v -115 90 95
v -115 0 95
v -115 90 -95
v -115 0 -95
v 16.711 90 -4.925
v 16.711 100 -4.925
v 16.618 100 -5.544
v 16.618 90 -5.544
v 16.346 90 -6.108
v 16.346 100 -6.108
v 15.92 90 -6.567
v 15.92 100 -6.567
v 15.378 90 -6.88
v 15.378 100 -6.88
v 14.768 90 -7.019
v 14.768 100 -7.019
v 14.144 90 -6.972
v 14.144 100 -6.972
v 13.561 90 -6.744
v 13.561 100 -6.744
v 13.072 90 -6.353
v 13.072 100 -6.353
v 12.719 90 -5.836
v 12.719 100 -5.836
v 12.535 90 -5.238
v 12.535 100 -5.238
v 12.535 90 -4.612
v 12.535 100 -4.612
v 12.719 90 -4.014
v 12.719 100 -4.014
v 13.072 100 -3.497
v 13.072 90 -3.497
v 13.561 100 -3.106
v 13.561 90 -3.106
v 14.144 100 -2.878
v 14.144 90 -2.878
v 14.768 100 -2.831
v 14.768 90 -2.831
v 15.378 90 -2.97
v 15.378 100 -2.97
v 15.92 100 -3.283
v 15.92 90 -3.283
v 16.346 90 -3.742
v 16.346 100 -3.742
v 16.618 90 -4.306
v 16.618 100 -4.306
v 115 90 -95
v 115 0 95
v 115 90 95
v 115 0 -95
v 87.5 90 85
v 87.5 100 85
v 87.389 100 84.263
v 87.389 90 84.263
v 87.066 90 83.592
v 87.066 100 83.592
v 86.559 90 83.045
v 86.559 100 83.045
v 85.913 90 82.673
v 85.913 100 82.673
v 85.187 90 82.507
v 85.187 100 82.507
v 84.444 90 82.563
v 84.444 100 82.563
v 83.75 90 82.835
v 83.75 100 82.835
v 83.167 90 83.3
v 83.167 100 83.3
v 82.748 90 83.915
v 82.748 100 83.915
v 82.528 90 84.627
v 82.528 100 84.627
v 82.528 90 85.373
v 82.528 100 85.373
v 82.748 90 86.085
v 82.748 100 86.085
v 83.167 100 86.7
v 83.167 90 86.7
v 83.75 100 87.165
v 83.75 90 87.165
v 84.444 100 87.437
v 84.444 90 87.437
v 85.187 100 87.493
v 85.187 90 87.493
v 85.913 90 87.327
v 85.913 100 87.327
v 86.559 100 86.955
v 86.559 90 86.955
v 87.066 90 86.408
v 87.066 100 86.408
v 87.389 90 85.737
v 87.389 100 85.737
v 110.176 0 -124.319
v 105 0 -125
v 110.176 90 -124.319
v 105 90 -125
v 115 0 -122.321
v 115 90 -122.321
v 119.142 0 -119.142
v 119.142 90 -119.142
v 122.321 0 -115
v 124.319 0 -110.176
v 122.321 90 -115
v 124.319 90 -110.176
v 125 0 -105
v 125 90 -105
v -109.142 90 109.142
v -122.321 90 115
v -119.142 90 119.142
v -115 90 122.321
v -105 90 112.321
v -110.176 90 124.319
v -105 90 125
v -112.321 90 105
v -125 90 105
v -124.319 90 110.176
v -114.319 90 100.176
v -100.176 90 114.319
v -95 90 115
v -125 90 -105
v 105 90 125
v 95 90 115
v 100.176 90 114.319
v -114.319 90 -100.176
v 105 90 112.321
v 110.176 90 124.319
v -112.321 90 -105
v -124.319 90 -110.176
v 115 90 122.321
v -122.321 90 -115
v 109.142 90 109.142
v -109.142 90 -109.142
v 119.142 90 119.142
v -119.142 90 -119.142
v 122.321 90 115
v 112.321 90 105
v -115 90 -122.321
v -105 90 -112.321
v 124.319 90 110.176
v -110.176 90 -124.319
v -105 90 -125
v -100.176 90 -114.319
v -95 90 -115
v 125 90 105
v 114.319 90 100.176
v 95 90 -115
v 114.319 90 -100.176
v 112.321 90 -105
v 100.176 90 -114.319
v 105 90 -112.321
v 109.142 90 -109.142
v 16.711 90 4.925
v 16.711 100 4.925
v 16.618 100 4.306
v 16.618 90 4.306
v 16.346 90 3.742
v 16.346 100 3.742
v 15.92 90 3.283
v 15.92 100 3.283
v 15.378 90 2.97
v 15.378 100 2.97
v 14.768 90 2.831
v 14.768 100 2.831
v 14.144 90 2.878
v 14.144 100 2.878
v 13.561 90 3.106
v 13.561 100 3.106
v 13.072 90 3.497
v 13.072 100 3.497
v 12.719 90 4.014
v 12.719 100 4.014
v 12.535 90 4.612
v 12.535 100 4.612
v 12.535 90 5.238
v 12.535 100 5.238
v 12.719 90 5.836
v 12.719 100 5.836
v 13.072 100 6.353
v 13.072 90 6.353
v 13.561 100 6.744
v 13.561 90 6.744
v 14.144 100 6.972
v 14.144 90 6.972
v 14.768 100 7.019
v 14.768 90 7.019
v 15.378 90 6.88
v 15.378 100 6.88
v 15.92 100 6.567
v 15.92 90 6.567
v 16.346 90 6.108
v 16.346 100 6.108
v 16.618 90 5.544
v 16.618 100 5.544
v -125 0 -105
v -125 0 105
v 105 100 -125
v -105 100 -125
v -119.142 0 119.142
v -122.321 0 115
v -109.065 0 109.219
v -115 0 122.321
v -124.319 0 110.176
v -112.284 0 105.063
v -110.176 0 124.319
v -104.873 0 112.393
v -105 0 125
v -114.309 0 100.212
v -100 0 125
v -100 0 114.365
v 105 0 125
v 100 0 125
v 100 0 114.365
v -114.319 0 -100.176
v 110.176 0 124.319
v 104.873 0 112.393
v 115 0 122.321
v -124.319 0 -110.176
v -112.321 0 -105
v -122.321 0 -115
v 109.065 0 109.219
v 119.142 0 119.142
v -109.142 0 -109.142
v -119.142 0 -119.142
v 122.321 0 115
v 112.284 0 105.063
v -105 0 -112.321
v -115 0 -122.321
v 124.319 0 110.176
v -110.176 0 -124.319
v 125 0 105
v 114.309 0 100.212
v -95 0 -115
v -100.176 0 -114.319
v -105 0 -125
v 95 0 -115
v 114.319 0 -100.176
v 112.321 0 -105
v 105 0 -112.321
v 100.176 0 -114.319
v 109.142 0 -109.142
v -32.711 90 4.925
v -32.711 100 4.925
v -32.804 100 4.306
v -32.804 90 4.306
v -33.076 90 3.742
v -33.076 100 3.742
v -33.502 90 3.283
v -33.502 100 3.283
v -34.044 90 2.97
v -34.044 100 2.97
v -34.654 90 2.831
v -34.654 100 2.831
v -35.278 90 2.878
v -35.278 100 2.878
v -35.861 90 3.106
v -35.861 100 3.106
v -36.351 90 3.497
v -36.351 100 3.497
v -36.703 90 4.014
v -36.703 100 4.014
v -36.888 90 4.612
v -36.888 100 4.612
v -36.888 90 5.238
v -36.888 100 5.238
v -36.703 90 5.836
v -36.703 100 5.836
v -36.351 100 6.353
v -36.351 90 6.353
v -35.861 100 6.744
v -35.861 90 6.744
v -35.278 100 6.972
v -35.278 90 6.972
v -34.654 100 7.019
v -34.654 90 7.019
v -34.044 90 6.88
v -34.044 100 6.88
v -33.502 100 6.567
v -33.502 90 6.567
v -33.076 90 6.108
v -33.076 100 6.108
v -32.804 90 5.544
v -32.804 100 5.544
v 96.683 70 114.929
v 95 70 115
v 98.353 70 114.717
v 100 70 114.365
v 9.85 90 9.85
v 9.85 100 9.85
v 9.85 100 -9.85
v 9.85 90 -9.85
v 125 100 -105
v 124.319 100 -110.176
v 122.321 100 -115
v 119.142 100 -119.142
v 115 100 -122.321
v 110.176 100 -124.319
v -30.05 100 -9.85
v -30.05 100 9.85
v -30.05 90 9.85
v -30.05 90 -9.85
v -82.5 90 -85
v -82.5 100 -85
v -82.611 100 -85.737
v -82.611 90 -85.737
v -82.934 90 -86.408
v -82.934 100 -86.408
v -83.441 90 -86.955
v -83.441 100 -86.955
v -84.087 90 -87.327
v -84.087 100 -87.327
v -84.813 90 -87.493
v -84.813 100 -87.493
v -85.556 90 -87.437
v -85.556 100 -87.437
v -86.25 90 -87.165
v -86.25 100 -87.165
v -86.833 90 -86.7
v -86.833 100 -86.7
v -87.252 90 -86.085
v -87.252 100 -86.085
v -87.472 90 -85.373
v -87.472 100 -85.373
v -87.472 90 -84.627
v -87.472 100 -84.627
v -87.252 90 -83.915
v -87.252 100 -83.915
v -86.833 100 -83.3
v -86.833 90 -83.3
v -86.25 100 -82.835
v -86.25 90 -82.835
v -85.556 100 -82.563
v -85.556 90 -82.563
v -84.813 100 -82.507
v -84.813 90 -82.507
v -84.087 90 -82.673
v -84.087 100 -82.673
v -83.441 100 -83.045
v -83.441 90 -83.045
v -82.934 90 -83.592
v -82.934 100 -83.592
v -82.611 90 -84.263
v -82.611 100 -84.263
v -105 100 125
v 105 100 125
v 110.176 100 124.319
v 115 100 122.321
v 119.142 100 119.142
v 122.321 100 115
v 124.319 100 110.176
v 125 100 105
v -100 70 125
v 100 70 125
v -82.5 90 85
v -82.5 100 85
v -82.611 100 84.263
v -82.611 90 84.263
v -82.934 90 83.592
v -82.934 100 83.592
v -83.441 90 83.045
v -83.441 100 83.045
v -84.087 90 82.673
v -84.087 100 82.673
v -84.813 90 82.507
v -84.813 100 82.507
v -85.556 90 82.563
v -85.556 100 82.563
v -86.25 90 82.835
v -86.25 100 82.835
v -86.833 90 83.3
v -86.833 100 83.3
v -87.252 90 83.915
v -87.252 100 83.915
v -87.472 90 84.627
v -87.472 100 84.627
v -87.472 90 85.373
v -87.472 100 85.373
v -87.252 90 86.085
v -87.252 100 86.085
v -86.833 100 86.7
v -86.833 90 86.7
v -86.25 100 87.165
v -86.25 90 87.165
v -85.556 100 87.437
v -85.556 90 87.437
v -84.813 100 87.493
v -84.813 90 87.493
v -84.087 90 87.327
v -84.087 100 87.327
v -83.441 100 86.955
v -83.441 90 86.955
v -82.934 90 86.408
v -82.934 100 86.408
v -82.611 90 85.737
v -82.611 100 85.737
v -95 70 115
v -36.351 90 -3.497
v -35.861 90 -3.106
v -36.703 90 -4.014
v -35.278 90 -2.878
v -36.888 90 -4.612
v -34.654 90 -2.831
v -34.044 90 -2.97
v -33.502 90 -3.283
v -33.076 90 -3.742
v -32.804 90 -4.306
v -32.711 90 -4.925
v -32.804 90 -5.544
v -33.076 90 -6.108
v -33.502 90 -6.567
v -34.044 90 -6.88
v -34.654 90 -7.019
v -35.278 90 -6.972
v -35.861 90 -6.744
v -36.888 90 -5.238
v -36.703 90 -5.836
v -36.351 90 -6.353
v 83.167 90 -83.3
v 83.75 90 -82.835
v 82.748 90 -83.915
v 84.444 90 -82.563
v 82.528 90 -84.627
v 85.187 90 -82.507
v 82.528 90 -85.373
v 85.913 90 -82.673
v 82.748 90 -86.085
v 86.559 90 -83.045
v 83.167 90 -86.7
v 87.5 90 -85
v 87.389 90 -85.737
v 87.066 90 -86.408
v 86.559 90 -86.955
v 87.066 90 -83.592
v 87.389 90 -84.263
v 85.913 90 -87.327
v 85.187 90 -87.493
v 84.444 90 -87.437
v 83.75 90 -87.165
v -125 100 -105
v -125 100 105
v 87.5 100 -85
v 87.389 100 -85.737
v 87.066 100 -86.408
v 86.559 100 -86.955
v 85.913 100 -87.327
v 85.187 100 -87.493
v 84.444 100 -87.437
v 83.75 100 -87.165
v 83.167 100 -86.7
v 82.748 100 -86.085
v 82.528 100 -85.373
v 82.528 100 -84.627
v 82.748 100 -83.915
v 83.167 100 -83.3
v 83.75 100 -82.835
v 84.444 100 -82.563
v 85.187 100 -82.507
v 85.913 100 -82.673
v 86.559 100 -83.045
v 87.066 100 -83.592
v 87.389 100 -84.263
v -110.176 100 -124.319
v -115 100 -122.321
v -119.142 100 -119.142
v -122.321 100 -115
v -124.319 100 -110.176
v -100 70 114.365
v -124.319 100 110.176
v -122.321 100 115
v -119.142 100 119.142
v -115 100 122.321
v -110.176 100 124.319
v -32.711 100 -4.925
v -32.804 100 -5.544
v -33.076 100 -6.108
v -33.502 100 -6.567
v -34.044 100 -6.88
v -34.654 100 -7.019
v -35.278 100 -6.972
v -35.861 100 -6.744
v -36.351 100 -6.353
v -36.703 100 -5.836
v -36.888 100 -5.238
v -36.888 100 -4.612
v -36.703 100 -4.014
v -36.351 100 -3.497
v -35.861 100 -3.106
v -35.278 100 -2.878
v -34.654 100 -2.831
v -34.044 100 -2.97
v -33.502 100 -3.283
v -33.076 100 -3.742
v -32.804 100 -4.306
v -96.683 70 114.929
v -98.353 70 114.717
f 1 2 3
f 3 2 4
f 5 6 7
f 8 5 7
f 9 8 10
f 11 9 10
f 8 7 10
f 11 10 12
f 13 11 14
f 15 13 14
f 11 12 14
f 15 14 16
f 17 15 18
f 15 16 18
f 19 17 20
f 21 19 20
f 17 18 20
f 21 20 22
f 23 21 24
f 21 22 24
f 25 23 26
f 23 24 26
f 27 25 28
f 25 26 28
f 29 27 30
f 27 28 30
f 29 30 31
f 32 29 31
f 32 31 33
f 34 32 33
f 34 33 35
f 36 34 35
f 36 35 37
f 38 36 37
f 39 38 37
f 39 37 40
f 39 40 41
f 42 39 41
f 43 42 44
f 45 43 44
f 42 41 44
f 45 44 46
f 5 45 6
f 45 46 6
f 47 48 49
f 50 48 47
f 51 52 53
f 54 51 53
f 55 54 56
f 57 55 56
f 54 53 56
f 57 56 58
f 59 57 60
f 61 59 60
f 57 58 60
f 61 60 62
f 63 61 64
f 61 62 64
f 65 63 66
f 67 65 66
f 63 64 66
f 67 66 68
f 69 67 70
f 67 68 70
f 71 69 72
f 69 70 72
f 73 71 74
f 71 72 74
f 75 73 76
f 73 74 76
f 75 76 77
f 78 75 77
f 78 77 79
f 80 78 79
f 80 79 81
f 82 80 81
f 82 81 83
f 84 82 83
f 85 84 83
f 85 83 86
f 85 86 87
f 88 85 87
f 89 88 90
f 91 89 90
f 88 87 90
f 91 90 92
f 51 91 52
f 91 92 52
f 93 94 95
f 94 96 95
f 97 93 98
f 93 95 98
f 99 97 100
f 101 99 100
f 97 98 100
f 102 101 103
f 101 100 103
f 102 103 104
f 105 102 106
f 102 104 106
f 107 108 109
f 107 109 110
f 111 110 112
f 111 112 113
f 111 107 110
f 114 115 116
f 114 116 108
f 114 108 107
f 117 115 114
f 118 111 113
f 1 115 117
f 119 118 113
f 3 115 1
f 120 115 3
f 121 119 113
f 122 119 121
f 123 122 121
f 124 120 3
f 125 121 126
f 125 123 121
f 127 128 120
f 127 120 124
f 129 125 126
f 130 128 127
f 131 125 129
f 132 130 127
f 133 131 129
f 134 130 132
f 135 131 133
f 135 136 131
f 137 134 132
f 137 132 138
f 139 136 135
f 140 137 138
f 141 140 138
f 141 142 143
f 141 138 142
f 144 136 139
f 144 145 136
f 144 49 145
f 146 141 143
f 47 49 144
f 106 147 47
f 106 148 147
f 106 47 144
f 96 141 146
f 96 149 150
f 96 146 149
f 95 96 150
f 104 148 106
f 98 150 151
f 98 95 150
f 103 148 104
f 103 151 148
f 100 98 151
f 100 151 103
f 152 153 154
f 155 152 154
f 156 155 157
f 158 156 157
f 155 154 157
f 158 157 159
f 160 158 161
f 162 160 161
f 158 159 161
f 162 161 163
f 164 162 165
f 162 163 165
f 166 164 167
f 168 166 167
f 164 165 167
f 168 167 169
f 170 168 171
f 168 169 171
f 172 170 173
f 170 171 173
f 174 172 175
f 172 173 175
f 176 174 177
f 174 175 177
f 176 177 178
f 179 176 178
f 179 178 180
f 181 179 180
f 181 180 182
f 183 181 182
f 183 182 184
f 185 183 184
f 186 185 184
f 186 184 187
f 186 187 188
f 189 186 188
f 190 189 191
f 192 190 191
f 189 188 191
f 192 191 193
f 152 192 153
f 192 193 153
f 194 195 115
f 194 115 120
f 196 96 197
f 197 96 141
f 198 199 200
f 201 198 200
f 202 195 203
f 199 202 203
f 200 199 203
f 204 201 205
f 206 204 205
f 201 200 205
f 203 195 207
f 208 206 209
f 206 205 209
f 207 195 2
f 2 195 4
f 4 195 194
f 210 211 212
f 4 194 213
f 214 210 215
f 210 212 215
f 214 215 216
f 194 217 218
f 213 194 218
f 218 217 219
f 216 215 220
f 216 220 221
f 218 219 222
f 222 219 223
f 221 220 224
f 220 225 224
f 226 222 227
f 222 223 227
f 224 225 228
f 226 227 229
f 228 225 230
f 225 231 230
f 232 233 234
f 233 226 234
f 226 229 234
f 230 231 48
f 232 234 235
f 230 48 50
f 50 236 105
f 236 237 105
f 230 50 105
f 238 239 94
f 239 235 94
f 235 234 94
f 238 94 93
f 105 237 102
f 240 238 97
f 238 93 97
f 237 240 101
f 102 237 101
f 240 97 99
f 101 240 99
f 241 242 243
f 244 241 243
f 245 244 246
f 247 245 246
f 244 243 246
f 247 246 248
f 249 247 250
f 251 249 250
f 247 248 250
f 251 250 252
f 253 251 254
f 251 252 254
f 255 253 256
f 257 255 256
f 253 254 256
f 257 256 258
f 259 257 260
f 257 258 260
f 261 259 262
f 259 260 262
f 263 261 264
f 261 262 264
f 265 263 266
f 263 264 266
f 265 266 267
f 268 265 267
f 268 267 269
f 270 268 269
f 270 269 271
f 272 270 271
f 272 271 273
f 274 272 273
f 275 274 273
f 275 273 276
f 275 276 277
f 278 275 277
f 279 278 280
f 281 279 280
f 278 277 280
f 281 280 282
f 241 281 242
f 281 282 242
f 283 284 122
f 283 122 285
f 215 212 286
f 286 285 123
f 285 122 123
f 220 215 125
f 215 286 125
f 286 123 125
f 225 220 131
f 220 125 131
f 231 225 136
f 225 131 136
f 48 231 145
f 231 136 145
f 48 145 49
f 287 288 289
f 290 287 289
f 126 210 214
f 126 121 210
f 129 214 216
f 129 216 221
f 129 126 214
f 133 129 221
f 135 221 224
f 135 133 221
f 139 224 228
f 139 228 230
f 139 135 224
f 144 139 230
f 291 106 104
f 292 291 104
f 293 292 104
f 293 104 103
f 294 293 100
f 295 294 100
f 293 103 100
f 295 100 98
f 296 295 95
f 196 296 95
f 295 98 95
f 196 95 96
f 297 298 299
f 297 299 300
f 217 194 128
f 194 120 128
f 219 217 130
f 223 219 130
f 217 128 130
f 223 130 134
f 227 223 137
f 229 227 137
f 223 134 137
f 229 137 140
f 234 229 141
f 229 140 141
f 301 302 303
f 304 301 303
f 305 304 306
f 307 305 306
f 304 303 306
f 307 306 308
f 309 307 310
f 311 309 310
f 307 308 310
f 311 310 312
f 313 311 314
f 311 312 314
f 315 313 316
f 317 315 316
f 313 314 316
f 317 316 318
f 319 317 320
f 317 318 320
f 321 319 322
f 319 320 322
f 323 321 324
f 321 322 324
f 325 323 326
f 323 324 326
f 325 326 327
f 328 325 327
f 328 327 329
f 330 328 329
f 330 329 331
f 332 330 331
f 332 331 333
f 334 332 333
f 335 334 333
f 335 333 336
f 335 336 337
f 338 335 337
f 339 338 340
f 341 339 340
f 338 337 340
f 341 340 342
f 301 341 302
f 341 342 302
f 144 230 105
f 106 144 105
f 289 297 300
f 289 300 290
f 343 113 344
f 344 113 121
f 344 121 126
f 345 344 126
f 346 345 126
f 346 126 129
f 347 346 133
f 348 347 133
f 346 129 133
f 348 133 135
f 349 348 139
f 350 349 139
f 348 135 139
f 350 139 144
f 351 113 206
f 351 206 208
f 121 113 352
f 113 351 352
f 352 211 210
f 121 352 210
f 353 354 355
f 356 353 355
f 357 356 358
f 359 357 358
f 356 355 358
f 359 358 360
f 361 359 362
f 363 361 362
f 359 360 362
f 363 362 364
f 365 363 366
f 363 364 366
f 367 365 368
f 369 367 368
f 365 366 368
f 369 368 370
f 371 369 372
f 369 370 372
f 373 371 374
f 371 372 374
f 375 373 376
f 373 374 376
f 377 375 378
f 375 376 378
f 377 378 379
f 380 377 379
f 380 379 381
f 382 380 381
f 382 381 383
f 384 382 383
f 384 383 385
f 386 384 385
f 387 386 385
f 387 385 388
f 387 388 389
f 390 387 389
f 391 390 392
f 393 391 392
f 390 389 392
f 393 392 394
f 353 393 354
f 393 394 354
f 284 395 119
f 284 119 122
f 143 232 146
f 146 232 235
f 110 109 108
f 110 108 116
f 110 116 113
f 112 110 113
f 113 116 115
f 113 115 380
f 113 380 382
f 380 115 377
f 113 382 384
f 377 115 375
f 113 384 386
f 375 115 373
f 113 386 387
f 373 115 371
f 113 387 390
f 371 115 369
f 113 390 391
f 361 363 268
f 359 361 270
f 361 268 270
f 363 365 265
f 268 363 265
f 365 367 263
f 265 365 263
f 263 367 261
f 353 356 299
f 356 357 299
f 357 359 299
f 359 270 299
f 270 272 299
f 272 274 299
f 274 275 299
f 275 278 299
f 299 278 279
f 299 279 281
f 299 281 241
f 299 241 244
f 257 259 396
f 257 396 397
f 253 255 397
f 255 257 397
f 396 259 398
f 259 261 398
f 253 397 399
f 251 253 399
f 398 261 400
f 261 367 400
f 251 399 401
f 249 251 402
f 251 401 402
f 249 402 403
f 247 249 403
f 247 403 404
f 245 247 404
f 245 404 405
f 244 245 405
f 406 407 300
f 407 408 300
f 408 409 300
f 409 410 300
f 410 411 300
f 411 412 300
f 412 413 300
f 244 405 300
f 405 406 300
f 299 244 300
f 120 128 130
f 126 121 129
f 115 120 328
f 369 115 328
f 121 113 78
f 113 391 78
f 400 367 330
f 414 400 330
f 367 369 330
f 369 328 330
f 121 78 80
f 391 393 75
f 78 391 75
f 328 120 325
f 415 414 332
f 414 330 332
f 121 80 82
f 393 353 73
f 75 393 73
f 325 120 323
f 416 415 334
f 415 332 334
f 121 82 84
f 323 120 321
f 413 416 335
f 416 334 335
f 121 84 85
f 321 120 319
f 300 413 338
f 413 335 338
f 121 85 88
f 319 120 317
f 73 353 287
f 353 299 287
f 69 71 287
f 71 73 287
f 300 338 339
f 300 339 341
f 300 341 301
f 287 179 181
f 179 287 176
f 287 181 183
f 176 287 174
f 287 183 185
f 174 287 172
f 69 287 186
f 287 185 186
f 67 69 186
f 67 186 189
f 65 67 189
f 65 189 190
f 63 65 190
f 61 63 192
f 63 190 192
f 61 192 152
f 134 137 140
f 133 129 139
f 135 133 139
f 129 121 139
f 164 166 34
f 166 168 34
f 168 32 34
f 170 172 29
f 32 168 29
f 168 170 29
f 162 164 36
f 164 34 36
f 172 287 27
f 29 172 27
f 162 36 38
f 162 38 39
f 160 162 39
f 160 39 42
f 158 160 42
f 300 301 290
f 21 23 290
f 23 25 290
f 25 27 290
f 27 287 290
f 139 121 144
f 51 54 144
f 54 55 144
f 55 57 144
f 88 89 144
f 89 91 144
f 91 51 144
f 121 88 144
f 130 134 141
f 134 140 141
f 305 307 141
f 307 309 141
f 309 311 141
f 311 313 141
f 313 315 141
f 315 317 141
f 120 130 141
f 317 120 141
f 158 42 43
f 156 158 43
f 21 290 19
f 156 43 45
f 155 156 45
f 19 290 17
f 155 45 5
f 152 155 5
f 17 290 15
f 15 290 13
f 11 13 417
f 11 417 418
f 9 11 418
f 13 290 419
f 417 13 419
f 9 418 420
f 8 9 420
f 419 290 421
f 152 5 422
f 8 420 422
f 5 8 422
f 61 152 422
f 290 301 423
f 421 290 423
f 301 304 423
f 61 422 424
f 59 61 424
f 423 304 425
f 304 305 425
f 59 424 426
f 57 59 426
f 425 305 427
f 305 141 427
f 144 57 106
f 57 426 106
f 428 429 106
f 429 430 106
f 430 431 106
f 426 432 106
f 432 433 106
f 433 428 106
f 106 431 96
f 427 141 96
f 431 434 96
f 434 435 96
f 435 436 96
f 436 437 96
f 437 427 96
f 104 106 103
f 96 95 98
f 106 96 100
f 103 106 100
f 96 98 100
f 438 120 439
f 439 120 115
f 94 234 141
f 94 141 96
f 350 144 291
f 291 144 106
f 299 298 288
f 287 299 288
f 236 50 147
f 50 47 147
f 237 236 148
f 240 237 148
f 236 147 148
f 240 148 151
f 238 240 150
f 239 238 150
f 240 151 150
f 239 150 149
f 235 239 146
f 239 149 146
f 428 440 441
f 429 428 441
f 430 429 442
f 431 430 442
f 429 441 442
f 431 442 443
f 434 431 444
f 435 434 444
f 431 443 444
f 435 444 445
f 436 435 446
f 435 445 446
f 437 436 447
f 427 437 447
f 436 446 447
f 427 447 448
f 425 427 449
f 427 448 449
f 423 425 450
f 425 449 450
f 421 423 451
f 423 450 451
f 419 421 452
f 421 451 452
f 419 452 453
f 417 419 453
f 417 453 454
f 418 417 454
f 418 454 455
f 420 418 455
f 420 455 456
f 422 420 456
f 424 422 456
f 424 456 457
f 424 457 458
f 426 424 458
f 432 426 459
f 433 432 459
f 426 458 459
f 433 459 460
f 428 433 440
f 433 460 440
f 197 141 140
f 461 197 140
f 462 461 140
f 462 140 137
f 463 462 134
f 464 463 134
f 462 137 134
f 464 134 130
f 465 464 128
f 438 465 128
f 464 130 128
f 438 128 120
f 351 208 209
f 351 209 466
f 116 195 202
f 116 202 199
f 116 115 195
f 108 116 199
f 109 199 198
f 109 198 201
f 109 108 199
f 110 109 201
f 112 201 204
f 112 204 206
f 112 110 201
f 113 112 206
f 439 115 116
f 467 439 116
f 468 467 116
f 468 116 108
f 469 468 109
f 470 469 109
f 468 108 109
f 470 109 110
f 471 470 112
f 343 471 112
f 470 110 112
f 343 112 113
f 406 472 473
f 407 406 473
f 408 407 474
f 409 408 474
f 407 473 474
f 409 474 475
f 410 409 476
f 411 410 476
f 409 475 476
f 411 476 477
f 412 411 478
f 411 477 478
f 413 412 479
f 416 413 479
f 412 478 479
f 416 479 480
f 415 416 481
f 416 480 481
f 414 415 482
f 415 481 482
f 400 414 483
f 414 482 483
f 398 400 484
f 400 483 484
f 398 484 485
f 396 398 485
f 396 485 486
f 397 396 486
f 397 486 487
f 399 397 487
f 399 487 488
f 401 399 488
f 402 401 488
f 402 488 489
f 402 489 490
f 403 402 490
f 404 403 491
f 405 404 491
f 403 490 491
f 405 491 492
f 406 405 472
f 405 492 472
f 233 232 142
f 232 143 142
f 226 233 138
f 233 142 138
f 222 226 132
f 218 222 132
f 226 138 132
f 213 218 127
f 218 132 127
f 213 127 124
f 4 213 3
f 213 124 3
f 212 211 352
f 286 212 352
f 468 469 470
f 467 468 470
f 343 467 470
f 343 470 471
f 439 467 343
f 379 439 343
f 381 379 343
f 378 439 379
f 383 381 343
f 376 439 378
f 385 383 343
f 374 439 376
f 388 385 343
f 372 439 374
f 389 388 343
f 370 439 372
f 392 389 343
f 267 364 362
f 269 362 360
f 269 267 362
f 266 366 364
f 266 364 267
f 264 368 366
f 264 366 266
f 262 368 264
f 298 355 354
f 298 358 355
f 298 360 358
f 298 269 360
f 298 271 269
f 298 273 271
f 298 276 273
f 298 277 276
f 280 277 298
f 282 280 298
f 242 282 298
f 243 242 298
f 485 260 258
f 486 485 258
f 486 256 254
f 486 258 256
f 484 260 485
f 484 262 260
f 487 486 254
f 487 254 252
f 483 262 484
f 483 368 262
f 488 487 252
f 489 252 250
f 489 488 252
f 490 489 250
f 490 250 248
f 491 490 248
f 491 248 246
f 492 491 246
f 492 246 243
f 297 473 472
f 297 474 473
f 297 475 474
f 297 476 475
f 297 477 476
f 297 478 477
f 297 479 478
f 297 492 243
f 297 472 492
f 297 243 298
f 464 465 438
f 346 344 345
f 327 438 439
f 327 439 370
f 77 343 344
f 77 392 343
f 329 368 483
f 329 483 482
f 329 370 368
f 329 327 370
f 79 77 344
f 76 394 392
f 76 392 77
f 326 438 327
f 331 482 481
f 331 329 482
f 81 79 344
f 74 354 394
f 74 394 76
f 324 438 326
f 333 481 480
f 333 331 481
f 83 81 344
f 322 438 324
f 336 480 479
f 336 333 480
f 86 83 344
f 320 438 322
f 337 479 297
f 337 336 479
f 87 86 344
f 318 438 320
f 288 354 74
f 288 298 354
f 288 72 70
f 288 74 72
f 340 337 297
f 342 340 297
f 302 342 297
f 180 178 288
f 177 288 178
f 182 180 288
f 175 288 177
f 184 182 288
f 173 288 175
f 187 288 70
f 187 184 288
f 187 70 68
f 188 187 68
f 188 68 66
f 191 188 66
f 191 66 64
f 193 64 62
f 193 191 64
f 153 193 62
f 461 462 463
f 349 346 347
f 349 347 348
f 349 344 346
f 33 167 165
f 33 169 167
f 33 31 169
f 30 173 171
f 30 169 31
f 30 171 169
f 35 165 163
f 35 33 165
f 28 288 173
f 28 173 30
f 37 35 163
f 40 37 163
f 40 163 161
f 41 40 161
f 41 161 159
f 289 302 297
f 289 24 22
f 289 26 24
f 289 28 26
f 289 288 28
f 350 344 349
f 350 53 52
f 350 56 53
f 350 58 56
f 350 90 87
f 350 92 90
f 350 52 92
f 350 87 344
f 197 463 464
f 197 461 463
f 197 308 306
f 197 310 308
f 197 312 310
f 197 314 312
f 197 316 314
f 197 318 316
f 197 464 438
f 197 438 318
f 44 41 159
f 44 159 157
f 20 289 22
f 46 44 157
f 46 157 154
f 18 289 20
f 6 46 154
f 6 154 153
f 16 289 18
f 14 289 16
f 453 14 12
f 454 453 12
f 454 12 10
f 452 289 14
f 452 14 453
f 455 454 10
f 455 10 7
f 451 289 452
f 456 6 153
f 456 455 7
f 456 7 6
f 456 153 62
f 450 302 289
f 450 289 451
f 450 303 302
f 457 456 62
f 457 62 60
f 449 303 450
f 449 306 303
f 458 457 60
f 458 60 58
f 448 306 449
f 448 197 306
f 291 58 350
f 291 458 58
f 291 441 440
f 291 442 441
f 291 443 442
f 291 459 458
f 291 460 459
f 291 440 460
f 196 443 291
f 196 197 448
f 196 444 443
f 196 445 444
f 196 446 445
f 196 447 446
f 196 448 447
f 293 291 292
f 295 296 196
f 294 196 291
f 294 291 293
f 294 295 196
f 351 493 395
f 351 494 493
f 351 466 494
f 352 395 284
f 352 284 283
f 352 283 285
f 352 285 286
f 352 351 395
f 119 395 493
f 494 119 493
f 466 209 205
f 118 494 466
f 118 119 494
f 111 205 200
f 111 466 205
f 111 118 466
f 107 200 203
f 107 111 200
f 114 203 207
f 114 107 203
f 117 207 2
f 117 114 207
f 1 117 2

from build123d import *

# Parameters (mm, degrees)
SKETCH1_W            = 250
SKETCH1_H            = 250
SKETCH1_W_2          = 230
SKETCH1_H_2          = 230
BOSS_EXTRUDE1_DEPTH  = 90
SKETCH2_W            = 200
SKETCH2_H            = 70
CUT_EXTRUDE1_DEPTH   = 50
FILLET1_R            = 20
BOSS_EXTRUDE2_DEPTH  = 10
SKETCH4_R            = 2.5
CUT_EXTRUDE2_DEPTH   = 10
LPATTERN1_COUNT      = 2
LPATTERN1_PITCH      = 170
LPATTERN1_COUNT_DIR2 = 2
LPATTERN1_PITCH_DIR2 = 170
SKETCH6_R            = 2.1
SKETCH6_W            = 39.9
SKETCH6_H            = 19.7
CUT_EXTRUDE3_DEPTH   = 10


with BuildPart() as part:
    # Sketch1 → Boss-Extrude1 (new body)
    with BuildSketch(Plane(origin=(0, 0, 0), x_dir=(1, 0, 0), z_dir=(0, 1, 0))):
        Rectangle(SKETCH1_W, SKETCH1_H)
        Rectangle(SKETCH1_W_2, SKETCH1_H_2, mode=Mode.SUBTRACT)
    extrude(amount=BOSS_EXTRUDE1_DEPTH)

    # Sketch2 → Cut-Extrude1 (cut)
    with BuildSketch(Plane.XY.offset(125)):
        with Locations((0, 35)):
            Rectangle(SKETCH2_W, SKETCH2_H)
    extrude(amount=-CUT_EXTRUDE1_DEPTH, mode=Mode.SUBTRACT)

    # Fillet1
    fillet1_edges = [part.edges().sort_by_distance(p)[0] for p in [
        (-115, 45, 115),
        (115, 45, 115),
        (115, 45, -115),
        (-115, 45, -115),
        (-125, 45, 125),
        (125, 45, 125),
        (125, 45, -125),
        (-125, 45, -125),
    ]]
    fillet(fillet1_edges, radius=FILLET1_R)


with BuildPart() as body_2:
    # Sketch3 → Boss-Extrude2 (new body)
    with BuildSketch(Plane(origin=(0, 90, 0), x_dir=(1, 0, 0), z_dir=(0, 1, 0))):
        with BuildLine():
            Line((-105, -125), (105, -125))
            ThreePointArc((105, -125), (119.142135624, -119.142135624), (125, -105))
            Line((125, -105), (125, 105))
            ThreePointArc((125, 105), (119.142135624, 119.142135624), (105, 125))
            Line((105, 125), (-105, 125))
            ThreePointArc((-105, 125), (-119.142135624, 119.142135624), (-125, 105))
            Line((-125, 105), (-125, -105))
            ThreePointArc((-125, -105), (-119.142135624, -119.142135624), (-105, -125))
        make_face()
    extrude(amount=BOSS_EXTRUDE2_DEPTH)

    # Sketch4 → Cut-Extrude2 (cut)
    with BuildSketch(Plane(origin=(0, 100, 0), x_dir=(1, 0, 0), z_dir=(0, 1, 0))):
        with Locations((-85, 85)):
            Circle(SKETCH4_R)
    cut_extrude2 = extrude(amount=-CUT_EXTRUDE2_DEPTH, mode=Mode.SUBTRACT)

    # LPattern1: Cut-Extrude2 2 × 2
    with Locations(*[(i * LPATTERN1_PITCH, 0, j * LPATTERN1_PITCH_DIR2) for i in range(LPATTERN1_COUNT) for j in range(LPATTERN1_COUNT_DIR2) if (i, j) != (0, 0)]):
        add(cut_extrude2, mode=Mode.SUBTRACT)

    # Sketch6 → Cut-Extrude3 (cut)
    with BuildSketch(Plane(origin=(0, 100, 0), x_dir=(1, 0, 0), z_dir=(0, 1, 0))):
        with Locations((-34.811145618, 4.925)):
            Circle(SKETCH6_R)
        with Locations((-34.811145618, -4.925)):
            Circle(SKETCH6_R)
        with Locations((14.611145618, -4.925)):
            Circle(SKETCH6_R)
        with Locations((14.611145618, 4.925)):
            Circle(SKETCH6_R)
        with Locations((-10.1, 0)):
            Rectangle(SKETCH6_W, SKETCH6_H)
    extrude(amount=-CUT_EXTRUDE3_DEPTH, mode=Mode.SUBTRACT)


solid = Compound([part.part, body_2.part])
